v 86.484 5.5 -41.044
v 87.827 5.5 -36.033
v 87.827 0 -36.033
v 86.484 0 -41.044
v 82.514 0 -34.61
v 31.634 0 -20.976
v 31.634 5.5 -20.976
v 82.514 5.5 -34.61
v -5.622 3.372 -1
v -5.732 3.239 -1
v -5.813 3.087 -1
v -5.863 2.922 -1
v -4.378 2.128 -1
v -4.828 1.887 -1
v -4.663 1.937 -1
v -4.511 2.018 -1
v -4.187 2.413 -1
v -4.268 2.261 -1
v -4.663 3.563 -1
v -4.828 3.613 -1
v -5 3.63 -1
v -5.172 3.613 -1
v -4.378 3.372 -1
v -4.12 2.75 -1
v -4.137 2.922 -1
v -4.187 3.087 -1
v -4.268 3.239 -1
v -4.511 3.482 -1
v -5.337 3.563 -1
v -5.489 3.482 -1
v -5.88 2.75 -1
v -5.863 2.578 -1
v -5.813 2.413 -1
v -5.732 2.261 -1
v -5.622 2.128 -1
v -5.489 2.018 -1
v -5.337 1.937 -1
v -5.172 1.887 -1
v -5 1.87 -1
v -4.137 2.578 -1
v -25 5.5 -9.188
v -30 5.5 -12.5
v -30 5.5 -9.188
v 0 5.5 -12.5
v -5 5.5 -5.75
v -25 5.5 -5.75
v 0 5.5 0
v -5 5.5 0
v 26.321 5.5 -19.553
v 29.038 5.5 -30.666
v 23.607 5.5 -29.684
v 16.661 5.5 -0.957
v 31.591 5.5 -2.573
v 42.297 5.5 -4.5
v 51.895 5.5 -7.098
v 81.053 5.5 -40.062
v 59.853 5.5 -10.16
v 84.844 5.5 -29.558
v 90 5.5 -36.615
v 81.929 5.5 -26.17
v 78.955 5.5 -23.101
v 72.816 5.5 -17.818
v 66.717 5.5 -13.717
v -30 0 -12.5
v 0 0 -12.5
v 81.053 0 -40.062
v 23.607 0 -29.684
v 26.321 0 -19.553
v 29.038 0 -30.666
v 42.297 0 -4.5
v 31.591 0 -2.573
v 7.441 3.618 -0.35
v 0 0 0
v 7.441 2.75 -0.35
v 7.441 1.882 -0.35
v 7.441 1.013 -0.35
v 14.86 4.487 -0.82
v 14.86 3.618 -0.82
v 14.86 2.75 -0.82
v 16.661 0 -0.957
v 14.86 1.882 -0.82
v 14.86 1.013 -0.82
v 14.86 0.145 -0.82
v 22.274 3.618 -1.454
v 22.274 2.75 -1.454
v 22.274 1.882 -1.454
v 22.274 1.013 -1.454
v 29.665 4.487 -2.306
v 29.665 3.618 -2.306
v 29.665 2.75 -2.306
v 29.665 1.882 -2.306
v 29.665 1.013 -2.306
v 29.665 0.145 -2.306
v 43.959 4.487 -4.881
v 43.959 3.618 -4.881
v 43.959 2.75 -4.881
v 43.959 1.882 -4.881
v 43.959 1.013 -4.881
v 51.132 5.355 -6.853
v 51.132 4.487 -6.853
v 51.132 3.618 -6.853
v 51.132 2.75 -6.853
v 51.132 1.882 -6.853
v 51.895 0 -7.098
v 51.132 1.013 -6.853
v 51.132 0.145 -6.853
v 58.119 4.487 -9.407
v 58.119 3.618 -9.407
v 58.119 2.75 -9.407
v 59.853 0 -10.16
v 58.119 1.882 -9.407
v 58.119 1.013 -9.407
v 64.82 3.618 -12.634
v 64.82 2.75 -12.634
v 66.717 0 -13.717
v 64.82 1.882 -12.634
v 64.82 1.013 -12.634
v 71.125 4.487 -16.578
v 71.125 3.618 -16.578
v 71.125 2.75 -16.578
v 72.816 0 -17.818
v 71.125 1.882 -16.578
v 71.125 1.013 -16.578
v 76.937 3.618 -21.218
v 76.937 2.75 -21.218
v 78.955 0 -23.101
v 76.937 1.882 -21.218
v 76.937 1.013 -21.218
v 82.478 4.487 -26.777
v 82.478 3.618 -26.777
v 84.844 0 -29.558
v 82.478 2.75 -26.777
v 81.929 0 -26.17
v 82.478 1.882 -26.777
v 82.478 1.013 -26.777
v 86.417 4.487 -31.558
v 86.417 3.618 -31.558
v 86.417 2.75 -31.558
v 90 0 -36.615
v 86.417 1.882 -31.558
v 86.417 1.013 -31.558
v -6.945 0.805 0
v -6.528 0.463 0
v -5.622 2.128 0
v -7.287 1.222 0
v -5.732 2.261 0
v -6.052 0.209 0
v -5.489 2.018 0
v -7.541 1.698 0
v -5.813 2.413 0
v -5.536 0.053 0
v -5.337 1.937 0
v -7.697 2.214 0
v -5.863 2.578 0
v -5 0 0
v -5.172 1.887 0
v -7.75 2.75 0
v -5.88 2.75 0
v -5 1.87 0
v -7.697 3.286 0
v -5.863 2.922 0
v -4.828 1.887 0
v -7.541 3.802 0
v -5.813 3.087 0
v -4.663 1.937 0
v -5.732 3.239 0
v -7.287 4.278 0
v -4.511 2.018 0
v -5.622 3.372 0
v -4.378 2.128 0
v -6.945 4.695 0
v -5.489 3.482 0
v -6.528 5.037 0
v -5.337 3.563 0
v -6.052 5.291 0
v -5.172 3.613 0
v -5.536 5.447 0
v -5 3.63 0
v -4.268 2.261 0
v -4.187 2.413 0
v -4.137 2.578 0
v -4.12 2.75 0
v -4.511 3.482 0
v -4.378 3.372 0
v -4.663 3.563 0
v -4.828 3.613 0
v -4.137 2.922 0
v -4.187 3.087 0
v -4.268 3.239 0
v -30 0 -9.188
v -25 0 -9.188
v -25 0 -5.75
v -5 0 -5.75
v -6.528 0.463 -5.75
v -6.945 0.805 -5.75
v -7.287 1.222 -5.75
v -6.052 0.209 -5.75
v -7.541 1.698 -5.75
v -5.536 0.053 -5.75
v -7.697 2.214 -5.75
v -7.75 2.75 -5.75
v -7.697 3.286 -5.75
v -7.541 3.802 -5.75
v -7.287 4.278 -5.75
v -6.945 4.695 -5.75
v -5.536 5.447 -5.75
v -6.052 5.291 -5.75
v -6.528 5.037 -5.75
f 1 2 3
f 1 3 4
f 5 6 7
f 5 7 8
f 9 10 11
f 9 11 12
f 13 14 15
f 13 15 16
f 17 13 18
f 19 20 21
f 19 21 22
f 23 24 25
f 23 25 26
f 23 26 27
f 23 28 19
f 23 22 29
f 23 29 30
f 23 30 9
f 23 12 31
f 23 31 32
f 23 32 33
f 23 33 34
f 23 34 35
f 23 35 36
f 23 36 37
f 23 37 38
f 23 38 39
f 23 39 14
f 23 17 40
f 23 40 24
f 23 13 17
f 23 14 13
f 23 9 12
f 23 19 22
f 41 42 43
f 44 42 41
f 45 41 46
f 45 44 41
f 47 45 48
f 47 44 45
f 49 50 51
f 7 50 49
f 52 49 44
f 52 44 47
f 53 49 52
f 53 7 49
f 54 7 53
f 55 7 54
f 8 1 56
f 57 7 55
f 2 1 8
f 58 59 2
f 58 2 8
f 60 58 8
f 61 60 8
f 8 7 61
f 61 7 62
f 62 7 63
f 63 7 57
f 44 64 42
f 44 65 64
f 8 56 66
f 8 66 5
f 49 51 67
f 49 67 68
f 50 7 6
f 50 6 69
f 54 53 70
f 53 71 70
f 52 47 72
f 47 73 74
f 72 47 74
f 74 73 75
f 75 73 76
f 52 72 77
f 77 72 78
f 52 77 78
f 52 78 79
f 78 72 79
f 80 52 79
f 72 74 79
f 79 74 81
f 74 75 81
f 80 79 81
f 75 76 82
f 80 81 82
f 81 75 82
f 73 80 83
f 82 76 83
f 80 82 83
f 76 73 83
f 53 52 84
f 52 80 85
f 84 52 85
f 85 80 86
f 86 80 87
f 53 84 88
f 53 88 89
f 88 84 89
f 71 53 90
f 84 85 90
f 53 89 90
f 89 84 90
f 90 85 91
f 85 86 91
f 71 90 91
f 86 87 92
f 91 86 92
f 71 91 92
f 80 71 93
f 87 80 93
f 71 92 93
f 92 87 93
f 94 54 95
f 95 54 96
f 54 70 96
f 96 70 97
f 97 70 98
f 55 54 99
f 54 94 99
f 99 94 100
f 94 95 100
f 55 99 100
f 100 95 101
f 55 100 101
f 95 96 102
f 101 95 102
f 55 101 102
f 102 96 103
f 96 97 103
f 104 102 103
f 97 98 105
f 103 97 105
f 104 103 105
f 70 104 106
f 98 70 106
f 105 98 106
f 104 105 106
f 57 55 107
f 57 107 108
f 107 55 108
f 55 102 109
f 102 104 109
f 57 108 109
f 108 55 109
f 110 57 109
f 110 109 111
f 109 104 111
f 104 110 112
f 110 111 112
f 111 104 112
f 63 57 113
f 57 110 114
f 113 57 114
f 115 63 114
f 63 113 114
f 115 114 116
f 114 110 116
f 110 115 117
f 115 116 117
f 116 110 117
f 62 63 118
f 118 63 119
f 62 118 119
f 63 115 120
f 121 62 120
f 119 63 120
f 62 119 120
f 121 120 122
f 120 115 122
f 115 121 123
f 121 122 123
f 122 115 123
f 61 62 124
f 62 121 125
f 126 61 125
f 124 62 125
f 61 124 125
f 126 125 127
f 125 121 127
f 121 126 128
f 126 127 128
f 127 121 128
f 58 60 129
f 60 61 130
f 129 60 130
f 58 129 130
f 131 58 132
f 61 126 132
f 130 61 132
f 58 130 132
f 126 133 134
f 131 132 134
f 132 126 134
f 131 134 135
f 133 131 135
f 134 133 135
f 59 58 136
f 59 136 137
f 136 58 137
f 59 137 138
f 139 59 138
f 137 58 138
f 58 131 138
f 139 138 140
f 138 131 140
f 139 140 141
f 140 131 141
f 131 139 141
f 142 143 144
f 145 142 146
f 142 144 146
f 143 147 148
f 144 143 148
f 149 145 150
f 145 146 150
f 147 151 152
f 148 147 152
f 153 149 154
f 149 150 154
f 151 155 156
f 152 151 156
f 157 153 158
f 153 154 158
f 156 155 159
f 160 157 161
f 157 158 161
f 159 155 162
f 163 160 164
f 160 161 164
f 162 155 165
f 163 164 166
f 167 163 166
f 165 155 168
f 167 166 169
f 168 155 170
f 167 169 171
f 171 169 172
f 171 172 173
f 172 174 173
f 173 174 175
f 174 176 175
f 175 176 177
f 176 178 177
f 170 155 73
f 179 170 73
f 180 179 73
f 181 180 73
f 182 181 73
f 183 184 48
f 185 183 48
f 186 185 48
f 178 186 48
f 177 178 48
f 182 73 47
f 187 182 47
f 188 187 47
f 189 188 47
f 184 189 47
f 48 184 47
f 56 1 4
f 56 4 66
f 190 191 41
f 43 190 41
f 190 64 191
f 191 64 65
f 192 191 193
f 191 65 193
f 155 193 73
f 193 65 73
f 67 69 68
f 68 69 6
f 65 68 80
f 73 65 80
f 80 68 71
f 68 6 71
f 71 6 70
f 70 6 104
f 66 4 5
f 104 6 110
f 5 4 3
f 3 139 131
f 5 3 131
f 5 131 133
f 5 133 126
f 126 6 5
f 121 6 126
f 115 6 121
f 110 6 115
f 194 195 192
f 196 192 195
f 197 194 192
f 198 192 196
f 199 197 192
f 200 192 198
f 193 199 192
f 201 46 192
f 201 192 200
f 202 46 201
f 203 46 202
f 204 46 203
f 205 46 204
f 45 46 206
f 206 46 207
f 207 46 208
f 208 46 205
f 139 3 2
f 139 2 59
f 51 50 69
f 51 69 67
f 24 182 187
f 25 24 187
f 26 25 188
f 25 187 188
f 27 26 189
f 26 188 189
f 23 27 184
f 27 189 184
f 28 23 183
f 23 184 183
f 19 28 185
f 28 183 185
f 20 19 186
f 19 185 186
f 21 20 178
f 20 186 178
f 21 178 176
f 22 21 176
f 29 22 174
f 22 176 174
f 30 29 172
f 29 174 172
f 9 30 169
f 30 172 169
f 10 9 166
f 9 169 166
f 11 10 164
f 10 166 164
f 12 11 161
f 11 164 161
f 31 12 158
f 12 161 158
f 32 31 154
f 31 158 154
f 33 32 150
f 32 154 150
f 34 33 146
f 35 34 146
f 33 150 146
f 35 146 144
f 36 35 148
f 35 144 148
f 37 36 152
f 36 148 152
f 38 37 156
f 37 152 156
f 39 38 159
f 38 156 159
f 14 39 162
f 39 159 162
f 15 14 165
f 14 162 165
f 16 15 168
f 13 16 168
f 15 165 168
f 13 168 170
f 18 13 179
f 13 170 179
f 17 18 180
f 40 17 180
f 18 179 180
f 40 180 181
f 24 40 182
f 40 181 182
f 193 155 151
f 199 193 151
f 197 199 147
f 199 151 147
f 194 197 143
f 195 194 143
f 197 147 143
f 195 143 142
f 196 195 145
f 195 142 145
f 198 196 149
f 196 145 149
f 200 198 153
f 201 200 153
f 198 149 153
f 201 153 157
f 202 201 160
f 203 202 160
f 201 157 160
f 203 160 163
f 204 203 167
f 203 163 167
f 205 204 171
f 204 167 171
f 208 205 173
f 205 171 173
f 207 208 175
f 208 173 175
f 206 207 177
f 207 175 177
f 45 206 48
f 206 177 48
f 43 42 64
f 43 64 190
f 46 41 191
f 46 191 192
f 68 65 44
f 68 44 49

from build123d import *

# Parameters (mm, degrees)
SALIENTE_EXTRUIR1_DEPTH = 5.5
CROQUIS3_W              = 12.5
CROQUIS3_H              = 5.5
SALIENTE_EXTRUIR2_DEPTH = 25
CROQUIS6_R              = 0.88
CORTAR_EXTRUIR3_DEPTH   = 1
CORTAR_EXTRUIR4_DEPTH   = 5.75
CROQUIS7_W              = 3.3125
CROQUIS7_H              = 5.5
SALIENTE_EXTRUIR3_DEPTH = 5
SALIENTE_EXTRUIR6_DEPTH = 5.5


with BuildPart() as part:
    # Croquis2 → Saliente-Extruir1 (new body)
    with BuildSketch(Plane(origin=(0, 0, 0), x_dir=(1, 0, 0), z_dir=(0, 1, 0))):
        with BuildLine():
            Line((0, 0), (0, 12.5))
            Line((0, 12.5), (90, 36.615427319))
            add(Edge.make_bspline(
                [(0, 0), (0.391394635, 0.015775005), (1.186974035, 0.048775969), (2.973718865, 0.125104104), (4.540088904, 0.200260299), (6.566615662, 0.300718996), (8.325276336, 0.397659311), (10.239345298, 0.508699867), (12.06569896, 0.624646025), (14.401457649, 0.783062706), (17.174575564, 0.991527453), (20.424315772, 1.267095632), (24.124041131, 1.631890725), (28.746499447, 2.160588299), (34.186717026, 2.916408992), (39.59920567, 3.869463595), (44.959442778, 5.077074293), (49.361815827, 6.280418231), (52.910692092, 7.400878923), (56.408168852, 8.673928793), (59.841449897, 10.111450972), (63.196917977, 11.722972852), (66.459987179, 13.514457641), (69.616669404, 15.487724177), (72.654216734, 17.639793831), (75.562633469, 19.963554552), (78.411401775, 22.516402339), (80.637238299, 24.750127709), (82.31420302, 26.576865179), (83.500174761, 27.941909388), (84.166451521, 28.729544399), (84.824720597, 29.529498585), (85.467901785, 30.330572576), (86.10961807, 31.152932899), (86.725824802, 31.959637263), (87.359215775, 32.814913902), (87.935303716, 33.605334305), (88.585351463, 34.5293994), (89.07725637, 35.234721433), (89.639386065, 36.072003958), (89.880241627, 36.43386466), (90, 36.615427319)],
                knots=[0.074542826, 0.074542826, 0.074542826, 0.074542826, 0.074542826, 0.089942005, 0.105341185, 0.120740364, 0.136139543, 0.151538723, 0.166937902, 0.182337082, 0.197736262, 0.22853462, 0.259332978, 0.290131335, 0.320929692, 0.382526405, 0.441205382, 0.472003704, 0.502802054, 0.533600416, 0.564398766, 0.595197066, 0.625995423, 0.656793872, 0.687592091, 0.718390433, 0.749188737, 0.779987363, 0.814189109, 0.822739652, 0.831290195, 0.839840738, 0.848391281, 0.856941796, 0.865492311, 0.874042825, 0.88259334, 0.891143874, 0.899694409, 0.908244943, 0.916795477, 0.916795477, 0.916795477, 0.916795477, 0.916795477], degree=4))
        make_face()
    extrude(amount=SALIENTE_EXTRUIR1_DEPTH)

    # Croquis3 → Saliente-Extruir2 (add)
    with BuildSketch(Plane.ZY):
        with Locations((-6.25, 2.75)):
            Rectangle(CROQUIS3_W, CROQUIS3_H)
    extrude(amount=SALIENTE_EXTRUIR2_DEPTH)

    # Croquis6 → Cortar-Extruir3 (cut)
    with BuildSketch(Plane.XY):
        with Locations((-5, 2.75)):
            Circle(CROQUIS6_R)
    extrude(amount=-CORTAR_EXTRUIR3_DEPTH, mode=Mode.SUBTRACT)

    # Croquis5 → Cortar-Extruir4 (cut)
    with BuildSketch(Plane.XY):
        with BuildLine():
            Line((-25, 5.5), (-25, 0))
            Line((-25, 0), (-5.000000004, 0))
            ThreePointArc((-5.000000004, 0), (-7.75, 2.750000002), (-5, 5.5))
            Line((-5, 5.5), (-25, 5.5))
        make_face()
    extrude(amount=-CORTAR_EXTRUIR4_DEPTH, mode=Mode.SUBTRACT)

    # Croquis7 → Saliente-Extruir3 (add)
    with BuildSketch(Plane.ZY.offset(25)):
        with Locations((-10.84375, 2.75)):
            Rectangle(CROQUIS7_W, CROQUIS7_H)
    extrude(amount=SALIENTE_EXTRUIR3_DEPTH)

    # Croquis10 → Saliente-Extruir6 (add)
    with BuildSketch(Plane(origin=(0, 5.5, 0), x_dir=(1, 0, 0), z_dir=(0, 1, 0))):
        Polygon((23.606721454, 29.684431199), (26.321478766, 19.552818979), (31.634070811, 20.976323727), (29.03783695, 30.665600406), align=None)
        Polygon((81.052969303, 40.062499841), (82.514074846, 34.60957972), (87.826666891, 36.033084468), (86.484084799, 41.043669048), align=None)
    extrude(amount=-SALIENTE_EXTRUIR6_DEPTH)


solid = part.part
